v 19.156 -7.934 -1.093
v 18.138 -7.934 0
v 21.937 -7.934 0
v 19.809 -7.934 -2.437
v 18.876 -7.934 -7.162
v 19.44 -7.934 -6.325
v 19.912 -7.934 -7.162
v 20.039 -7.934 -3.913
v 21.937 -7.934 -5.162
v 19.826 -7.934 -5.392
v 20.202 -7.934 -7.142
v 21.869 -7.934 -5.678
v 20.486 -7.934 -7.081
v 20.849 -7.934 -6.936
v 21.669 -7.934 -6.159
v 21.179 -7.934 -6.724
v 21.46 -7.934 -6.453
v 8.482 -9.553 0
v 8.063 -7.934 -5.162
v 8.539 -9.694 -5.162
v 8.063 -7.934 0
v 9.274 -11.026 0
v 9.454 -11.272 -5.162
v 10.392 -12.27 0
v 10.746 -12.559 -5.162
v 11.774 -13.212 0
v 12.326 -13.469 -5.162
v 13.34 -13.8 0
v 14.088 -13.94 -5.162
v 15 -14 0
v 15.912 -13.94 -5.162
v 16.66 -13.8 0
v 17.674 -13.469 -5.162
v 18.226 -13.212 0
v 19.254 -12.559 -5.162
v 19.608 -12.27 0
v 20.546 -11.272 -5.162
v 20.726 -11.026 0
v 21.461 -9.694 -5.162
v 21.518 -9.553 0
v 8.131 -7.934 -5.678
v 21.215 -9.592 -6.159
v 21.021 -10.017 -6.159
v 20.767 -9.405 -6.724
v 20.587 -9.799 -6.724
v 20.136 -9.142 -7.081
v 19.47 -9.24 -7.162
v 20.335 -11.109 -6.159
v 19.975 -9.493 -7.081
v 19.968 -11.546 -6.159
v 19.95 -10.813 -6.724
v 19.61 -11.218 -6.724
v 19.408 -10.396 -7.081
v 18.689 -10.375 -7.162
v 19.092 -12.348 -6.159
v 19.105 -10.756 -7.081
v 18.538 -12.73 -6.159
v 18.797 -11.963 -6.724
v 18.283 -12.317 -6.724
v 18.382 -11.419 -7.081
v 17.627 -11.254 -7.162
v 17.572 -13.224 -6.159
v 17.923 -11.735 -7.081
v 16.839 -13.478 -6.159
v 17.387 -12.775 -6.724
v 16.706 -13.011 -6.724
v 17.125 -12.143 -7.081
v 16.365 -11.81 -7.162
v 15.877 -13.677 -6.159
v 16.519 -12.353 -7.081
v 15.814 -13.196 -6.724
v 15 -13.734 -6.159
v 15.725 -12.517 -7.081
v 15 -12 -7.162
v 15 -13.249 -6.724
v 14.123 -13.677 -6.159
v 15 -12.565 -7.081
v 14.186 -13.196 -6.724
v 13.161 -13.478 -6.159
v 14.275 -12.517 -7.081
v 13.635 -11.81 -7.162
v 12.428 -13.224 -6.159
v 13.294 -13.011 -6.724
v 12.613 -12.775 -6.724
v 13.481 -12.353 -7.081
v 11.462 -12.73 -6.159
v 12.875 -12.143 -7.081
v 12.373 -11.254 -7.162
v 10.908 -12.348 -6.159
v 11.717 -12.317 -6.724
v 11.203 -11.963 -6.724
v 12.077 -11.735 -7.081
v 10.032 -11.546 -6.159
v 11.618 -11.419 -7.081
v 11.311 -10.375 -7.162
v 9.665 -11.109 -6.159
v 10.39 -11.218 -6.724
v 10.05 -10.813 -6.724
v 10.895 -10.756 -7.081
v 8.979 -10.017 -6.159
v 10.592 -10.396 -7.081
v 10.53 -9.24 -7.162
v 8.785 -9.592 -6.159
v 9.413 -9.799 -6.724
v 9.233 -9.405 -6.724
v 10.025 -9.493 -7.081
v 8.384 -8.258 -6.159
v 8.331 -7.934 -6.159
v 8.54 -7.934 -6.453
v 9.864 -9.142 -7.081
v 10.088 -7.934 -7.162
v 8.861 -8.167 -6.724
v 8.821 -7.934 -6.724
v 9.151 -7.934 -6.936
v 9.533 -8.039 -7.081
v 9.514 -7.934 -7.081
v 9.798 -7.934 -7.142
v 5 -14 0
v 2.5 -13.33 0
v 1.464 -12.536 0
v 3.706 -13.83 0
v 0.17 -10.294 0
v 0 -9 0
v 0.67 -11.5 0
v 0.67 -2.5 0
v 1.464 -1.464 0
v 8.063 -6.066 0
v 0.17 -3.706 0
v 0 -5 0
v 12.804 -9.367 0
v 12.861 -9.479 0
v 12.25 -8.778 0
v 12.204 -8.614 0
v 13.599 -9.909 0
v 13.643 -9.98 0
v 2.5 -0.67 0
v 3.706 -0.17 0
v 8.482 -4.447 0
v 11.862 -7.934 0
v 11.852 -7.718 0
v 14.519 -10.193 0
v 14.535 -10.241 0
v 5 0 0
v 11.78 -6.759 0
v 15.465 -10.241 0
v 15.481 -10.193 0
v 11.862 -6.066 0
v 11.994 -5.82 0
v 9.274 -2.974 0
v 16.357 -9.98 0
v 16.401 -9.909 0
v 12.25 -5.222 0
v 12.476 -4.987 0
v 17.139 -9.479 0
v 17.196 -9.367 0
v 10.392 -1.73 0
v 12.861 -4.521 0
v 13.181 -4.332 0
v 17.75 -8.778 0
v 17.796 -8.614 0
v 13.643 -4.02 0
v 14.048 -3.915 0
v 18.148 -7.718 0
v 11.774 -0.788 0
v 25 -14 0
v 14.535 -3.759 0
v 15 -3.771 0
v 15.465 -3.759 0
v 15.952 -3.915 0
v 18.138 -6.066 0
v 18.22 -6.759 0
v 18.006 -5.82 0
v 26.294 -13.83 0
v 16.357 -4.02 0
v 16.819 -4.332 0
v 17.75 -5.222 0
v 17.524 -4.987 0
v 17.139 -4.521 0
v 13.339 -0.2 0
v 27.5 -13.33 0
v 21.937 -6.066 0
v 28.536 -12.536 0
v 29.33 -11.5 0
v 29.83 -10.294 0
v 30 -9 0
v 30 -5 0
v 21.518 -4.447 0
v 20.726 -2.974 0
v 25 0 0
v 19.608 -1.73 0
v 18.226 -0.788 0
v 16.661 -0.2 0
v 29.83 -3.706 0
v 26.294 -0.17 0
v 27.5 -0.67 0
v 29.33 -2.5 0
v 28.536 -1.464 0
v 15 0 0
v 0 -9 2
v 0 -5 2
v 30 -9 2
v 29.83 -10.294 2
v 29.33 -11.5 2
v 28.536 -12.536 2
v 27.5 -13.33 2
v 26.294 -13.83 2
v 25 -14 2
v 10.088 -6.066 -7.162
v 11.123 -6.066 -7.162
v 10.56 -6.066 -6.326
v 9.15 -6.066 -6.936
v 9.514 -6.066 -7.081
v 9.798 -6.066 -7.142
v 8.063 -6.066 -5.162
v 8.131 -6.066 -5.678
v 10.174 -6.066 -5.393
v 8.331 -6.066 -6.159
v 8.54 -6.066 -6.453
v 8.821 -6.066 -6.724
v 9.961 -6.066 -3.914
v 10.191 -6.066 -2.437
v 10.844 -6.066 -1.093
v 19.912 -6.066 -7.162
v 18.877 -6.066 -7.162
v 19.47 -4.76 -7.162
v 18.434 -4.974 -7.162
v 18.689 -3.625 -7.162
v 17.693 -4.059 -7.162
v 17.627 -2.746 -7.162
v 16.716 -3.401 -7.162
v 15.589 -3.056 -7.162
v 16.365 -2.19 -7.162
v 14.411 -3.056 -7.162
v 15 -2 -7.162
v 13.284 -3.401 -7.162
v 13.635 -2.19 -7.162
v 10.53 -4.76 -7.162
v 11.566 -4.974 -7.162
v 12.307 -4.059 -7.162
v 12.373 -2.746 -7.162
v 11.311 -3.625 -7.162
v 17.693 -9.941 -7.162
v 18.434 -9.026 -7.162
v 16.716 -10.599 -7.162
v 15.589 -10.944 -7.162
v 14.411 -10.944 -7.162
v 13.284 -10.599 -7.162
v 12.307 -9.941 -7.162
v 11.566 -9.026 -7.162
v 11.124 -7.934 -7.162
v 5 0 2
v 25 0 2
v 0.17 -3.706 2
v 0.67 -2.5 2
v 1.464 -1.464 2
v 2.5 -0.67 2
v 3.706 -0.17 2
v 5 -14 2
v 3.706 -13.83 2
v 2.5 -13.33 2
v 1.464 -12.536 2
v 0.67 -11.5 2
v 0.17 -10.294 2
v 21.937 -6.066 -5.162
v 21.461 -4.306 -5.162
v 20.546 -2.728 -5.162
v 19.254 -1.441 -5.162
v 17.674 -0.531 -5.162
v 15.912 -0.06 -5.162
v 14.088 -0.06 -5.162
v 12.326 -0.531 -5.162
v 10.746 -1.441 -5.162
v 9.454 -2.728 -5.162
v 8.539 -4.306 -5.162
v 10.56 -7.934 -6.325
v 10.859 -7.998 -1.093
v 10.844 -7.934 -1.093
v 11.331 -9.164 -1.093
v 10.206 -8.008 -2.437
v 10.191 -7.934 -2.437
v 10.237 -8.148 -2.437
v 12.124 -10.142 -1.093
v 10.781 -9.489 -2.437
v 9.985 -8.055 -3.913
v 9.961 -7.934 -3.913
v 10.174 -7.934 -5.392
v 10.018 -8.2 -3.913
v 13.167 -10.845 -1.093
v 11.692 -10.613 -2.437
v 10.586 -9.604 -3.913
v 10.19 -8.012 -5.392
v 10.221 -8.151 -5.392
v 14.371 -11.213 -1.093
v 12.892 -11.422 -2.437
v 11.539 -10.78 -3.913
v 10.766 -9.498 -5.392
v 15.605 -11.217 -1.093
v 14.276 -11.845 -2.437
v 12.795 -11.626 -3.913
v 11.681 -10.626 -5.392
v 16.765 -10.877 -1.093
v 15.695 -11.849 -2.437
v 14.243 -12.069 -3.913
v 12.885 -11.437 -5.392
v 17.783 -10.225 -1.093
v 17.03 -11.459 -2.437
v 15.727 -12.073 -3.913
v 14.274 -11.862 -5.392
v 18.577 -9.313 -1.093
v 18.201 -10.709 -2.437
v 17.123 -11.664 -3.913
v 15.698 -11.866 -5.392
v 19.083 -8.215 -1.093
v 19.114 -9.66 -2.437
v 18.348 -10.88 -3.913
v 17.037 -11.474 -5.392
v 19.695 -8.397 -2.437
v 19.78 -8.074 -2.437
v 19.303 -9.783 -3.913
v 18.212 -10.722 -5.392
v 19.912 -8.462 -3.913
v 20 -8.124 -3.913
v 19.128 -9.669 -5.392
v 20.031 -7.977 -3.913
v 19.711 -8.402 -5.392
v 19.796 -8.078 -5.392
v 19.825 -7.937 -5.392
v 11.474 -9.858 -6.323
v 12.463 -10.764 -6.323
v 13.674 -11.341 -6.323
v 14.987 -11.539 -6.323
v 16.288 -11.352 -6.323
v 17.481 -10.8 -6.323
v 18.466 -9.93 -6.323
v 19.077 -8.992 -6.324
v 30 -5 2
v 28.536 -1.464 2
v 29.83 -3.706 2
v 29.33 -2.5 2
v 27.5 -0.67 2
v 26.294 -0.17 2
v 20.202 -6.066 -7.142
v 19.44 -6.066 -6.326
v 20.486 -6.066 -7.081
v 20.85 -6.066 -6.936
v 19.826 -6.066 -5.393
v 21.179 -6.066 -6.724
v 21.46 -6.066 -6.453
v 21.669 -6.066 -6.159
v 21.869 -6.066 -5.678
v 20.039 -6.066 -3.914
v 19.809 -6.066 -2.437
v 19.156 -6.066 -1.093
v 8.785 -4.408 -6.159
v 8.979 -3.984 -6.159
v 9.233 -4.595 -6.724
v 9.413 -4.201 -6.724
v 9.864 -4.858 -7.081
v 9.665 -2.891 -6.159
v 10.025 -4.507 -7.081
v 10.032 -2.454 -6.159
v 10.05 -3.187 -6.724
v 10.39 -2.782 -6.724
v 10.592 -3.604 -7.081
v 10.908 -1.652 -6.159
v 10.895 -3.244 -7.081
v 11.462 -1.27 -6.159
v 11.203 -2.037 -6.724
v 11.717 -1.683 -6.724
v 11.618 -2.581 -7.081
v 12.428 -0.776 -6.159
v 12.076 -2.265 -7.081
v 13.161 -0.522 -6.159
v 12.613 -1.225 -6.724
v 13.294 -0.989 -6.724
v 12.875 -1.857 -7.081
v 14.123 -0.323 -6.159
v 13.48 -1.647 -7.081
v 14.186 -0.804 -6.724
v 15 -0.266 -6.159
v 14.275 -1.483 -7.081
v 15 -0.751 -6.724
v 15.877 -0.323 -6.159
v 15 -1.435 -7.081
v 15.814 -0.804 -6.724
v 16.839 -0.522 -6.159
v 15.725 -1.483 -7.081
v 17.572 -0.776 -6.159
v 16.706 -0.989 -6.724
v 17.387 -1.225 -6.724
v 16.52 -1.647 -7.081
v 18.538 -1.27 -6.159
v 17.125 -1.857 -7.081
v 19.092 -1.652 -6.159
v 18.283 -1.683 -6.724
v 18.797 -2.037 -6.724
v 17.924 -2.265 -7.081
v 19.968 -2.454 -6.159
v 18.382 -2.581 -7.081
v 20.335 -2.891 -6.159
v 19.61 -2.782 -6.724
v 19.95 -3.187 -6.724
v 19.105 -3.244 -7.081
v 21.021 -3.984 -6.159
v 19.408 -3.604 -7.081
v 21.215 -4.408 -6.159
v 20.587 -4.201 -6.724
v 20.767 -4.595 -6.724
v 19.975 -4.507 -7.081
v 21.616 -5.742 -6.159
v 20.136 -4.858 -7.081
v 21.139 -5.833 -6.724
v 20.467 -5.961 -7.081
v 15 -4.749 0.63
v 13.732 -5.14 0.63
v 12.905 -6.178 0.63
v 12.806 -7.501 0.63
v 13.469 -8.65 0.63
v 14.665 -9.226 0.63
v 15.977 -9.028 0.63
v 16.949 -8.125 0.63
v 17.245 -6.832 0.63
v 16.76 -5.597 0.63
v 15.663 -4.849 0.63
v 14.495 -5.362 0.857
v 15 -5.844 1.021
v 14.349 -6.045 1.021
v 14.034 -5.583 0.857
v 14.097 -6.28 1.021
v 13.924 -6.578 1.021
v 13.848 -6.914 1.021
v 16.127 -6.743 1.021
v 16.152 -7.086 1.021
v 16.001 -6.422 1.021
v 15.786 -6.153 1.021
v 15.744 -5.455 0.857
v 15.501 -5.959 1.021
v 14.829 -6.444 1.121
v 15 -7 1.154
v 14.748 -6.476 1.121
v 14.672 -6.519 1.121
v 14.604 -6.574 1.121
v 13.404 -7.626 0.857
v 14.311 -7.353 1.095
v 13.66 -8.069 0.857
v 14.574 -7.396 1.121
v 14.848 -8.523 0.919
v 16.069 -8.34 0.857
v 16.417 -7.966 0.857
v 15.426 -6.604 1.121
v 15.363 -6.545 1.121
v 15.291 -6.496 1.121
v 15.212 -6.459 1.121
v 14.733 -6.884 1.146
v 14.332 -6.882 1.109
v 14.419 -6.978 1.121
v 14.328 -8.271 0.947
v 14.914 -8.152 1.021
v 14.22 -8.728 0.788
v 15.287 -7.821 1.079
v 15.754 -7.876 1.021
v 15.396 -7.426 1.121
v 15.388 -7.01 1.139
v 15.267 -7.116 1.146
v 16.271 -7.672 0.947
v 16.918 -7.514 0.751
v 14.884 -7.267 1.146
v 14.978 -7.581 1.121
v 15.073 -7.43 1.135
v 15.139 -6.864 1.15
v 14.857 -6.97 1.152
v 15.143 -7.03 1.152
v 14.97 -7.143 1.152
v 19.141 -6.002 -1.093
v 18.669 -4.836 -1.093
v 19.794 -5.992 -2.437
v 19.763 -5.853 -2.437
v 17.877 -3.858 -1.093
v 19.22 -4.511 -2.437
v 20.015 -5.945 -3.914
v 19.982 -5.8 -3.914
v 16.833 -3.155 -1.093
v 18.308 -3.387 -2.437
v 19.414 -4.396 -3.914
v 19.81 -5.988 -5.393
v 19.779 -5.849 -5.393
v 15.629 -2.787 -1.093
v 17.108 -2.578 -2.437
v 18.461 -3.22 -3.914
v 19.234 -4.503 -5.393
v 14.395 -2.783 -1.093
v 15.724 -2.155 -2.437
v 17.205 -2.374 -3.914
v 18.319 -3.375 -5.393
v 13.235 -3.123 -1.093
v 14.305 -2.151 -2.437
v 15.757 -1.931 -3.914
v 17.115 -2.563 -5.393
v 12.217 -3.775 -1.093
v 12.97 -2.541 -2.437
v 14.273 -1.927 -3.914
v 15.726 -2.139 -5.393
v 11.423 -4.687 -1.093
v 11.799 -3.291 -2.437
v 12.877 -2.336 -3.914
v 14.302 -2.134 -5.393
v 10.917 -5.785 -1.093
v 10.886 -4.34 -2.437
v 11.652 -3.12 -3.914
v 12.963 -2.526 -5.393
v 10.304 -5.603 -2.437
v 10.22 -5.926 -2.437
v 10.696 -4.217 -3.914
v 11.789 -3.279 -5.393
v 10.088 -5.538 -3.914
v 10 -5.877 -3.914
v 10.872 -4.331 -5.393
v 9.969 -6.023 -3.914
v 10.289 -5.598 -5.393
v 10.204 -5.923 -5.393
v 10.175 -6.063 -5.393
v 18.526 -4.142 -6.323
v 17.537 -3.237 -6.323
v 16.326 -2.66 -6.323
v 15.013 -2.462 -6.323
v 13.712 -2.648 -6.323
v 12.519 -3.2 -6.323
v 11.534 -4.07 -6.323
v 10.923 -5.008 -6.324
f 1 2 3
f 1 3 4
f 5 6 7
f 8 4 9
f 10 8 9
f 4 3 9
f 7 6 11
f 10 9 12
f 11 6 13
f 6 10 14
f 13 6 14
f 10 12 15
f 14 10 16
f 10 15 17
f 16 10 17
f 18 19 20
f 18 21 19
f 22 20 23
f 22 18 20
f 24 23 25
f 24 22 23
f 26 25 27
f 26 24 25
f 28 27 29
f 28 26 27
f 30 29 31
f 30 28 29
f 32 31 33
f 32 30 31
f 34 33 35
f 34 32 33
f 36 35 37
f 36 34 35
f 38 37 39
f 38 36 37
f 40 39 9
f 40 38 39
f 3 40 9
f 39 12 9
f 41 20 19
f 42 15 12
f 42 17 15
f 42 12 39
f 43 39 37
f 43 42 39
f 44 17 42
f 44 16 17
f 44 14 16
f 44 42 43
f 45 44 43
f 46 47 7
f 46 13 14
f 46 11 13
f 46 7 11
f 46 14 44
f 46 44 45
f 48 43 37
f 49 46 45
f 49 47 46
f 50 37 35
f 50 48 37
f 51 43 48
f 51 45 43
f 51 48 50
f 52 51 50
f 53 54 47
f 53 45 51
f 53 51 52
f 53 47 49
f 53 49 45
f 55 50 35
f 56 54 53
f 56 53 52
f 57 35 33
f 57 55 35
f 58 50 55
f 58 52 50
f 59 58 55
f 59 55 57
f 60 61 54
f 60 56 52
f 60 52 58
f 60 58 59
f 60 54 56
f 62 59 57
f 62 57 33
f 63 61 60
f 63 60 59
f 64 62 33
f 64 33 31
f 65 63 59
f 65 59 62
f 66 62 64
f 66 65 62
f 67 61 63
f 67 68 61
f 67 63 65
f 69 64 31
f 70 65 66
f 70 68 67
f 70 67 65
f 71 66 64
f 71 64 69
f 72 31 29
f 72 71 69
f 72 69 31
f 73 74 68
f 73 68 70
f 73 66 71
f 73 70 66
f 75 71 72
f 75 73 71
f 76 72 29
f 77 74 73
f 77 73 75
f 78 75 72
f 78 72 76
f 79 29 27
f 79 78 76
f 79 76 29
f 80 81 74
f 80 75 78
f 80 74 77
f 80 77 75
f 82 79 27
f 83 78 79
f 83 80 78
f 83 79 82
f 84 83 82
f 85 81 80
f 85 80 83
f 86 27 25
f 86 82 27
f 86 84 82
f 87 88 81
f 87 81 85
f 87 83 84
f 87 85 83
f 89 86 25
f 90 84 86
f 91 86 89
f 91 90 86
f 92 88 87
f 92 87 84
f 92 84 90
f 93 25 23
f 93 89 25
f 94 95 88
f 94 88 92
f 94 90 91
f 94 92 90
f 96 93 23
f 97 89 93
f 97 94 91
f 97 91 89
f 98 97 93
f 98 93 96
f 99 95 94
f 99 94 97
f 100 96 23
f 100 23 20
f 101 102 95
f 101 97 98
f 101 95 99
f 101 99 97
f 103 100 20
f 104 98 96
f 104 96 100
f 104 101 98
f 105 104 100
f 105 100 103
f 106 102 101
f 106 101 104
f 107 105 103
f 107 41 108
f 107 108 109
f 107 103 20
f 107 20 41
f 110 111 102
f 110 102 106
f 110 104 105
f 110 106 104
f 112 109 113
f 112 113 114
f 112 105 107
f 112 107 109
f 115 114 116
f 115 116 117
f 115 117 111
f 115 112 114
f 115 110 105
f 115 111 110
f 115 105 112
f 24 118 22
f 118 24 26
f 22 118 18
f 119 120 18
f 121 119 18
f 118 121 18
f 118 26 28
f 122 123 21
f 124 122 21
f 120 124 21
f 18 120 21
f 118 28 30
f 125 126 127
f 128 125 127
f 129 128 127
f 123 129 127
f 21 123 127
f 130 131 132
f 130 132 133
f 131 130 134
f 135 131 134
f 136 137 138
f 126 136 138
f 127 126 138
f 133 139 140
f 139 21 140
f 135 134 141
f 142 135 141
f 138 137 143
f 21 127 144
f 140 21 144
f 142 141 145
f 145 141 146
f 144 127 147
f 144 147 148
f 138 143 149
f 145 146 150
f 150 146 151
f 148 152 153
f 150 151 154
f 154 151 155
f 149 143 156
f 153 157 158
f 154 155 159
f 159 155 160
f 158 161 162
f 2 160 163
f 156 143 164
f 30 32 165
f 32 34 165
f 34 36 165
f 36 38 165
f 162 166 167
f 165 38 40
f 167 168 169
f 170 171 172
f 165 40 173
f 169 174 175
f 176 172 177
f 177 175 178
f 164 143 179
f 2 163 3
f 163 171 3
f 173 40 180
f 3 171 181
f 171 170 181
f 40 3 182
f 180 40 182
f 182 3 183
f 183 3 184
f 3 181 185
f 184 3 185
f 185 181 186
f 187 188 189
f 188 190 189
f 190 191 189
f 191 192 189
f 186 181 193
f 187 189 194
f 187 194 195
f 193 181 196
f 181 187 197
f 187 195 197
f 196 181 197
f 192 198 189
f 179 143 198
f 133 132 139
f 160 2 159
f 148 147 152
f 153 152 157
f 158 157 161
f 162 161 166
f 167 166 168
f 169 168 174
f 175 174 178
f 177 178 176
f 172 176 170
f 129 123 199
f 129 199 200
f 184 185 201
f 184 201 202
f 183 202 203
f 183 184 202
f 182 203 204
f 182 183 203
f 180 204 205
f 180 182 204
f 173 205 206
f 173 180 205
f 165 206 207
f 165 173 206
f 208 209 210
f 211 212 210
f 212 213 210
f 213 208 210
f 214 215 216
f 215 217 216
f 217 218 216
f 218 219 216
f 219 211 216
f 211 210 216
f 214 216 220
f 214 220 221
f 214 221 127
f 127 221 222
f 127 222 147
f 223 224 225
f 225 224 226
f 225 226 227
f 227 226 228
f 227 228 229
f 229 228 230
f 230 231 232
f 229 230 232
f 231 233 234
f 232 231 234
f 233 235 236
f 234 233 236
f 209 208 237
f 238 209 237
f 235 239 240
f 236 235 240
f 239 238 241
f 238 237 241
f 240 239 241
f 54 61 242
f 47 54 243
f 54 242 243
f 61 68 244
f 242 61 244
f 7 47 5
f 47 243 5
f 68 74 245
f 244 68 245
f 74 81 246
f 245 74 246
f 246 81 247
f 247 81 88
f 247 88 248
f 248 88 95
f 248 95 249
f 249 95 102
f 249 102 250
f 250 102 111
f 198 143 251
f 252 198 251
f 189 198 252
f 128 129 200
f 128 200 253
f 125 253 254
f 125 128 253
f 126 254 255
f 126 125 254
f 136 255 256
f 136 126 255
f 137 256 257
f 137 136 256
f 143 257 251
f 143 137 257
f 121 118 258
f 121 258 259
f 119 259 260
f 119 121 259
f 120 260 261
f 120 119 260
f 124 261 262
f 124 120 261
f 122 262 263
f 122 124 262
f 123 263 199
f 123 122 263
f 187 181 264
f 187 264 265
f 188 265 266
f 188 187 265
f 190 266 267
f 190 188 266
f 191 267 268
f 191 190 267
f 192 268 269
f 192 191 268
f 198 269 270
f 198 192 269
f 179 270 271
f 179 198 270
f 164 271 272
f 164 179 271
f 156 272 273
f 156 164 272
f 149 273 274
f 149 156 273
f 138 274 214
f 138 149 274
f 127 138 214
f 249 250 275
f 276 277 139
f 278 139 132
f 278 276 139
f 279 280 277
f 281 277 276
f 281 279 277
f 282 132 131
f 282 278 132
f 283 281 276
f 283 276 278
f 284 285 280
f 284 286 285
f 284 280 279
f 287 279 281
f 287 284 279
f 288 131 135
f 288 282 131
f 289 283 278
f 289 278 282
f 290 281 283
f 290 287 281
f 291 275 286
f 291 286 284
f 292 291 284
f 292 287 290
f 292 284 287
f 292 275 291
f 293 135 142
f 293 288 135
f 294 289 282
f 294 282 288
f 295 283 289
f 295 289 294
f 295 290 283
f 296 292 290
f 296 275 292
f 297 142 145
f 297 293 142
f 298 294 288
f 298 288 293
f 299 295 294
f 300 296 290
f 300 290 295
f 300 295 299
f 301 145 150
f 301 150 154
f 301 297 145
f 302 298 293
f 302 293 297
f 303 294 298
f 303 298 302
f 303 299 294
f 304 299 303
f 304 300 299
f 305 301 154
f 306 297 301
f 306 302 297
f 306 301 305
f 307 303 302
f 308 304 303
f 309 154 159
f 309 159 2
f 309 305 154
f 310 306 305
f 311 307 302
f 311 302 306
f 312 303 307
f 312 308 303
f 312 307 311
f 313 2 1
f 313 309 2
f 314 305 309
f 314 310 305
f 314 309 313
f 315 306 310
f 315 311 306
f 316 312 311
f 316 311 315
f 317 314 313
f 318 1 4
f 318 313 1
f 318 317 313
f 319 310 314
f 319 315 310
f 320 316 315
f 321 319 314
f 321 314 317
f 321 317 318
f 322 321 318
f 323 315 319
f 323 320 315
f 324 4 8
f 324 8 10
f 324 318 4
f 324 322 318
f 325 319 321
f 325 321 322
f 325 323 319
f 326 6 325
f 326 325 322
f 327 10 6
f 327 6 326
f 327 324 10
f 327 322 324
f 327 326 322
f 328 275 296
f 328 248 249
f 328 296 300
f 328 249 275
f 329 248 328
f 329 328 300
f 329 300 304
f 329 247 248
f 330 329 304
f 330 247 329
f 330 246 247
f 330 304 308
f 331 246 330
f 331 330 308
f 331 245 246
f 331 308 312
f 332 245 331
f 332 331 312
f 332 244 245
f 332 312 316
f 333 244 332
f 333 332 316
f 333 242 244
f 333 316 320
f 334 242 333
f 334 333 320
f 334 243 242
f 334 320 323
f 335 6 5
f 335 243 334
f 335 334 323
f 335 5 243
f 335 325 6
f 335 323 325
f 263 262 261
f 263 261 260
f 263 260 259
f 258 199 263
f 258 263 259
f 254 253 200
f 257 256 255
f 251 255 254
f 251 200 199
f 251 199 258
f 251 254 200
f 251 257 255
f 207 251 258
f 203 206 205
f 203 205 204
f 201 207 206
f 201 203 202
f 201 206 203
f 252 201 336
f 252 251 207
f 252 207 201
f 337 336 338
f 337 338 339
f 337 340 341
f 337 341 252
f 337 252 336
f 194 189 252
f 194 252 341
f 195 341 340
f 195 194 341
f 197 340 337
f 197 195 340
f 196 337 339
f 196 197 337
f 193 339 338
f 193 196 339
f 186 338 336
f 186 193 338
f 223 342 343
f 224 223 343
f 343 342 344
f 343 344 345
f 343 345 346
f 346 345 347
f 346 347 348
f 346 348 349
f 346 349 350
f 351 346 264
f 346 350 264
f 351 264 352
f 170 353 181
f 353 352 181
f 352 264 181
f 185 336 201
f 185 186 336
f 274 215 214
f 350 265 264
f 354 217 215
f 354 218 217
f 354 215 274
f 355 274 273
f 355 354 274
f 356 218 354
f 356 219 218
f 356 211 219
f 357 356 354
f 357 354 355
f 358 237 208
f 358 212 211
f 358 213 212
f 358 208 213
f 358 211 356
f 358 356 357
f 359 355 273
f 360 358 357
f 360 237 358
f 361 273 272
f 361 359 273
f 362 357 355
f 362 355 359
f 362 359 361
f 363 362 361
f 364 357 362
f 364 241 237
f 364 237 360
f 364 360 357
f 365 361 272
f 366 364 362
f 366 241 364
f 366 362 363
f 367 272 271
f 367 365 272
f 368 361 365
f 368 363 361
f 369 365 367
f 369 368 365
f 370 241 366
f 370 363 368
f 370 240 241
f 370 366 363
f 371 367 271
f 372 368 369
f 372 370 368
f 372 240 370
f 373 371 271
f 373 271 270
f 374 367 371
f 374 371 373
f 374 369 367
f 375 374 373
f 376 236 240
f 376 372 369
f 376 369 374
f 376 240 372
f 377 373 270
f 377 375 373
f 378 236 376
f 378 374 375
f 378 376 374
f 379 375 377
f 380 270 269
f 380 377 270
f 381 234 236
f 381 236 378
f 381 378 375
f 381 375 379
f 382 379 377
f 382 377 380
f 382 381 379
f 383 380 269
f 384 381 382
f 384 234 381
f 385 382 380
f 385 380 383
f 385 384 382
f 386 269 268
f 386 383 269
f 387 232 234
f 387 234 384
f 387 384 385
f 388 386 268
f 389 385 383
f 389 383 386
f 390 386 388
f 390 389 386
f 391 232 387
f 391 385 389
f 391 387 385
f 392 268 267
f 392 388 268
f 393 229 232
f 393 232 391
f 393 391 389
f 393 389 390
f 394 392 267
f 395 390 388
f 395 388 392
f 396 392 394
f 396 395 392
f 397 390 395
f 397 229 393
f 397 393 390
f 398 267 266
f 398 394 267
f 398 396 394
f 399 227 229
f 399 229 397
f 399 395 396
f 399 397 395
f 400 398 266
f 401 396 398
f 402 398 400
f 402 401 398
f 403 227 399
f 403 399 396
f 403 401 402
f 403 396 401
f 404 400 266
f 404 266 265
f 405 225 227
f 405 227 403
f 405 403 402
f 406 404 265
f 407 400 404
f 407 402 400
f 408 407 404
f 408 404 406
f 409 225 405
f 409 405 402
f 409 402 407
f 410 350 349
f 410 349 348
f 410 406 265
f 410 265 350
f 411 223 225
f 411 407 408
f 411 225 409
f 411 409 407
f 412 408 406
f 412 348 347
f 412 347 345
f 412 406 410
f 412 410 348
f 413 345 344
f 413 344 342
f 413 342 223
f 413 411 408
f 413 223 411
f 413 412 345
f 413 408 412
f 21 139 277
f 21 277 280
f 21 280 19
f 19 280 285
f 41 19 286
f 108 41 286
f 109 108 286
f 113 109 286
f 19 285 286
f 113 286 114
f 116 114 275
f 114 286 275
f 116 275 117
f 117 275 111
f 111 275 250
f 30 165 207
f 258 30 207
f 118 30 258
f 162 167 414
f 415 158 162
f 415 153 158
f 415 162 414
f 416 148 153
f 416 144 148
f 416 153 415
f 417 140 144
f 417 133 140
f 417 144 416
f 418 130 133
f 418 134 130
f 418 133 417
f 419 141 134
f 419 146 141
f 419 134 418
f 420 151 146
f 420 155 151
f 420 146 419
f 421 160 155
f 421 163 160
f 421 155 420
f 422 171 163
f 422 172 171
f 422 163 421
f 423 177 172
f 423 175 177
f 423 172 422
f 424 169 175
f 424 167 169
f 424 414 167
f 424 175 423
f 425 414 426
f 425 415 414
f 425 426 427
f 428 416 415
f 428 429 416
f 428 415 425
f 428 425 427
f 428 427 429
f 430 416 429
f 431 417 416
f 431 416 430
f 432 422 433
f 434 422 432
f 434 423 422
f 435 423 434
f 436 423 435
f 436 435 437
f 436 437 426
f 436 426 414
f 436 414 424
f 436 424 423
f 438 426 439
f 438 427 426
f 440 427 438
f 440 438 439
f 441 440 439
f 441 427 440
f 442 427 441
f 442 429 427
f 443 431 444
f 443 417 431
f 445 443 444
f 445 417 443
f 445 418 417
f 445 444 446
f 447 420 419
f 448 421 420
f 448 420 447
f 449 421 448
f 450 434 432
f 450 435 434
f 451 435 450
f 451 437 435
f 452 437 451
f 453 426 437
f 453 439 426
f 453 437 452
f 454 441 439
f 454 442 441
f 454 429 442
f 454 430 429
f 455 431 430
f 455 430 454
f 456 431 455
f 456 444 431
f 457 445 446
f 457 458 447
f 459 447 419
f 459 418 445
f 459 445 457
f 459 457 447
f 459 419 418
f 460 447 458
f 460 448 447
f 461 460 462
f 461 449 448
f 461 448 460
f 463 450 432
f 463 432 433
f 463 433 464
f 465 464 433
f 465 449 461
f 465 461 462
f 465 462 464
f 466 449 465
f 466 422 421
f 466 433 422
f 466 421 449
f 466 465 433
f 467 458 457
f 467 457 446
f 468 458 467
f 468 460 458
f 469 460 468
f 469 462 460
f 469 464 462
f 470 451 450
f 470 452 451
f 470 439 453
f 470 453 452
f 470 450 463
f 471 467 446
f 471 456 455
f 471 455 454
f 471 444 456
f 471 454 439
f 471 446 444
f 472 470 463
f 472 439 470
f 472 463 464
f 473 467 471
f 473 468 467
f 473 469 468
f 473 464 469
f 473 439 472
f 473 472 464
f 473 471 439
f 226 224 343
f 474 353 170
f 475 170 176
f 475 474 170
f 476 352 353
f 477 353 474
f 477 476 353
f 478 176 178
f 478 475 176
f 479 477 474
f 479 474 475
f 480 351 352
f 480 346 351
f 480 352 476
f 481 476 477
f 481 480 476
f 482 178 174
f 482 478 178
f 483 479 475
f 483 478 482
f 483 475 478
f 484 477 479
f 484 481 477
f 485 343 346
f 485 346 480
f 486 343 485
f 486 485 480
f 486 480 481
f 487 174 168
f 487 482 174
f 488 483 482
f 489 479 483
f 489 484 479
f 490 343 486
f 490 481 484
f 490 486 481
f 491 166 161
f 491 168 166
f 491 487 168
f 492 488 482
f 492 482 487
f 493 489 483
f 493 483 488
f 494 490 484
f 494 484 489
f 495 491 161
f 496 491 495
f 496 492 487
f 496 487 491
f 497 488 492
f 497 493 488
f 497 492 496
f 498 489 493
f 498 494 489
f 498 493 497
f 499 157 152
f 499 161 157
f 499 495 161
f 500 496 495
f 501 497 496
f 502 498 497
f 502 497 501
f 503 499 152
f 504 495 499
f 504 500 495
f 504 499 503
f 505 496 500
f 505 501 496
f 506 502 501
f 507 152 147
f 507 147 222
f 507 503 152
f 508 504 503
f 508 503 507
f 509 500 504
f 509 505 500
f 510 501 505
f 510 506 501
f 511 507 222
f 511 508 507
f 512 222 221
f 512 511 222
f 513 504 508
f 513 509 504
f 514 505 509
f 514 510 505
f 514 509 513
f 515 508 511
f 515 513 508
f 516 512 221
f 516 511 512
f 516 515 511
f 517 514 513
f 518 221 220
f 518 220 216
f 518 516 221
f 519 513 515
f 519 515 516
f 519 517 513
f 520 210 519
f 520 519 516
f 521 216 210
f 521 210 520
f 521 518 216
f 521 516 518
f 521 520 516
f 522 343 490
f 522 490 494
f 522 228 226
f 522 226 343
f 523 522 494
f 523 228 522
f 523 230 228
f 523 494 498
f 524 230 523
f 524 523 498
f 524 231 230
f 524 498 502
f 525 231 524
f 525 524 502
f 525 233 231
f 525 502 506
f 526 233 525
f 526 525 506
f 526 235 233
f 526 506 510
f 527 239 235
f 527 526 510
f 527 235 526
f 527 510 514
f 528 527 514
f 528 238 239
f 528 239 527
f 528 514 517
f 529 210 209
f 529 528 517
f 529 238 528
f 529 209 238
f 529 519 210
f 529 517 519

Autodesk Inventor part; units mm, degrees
ref_plane "YZ Plane" through (0, 0, 0) normal (1, 0, 0) x (0, 1, 0)
ref_plane "XZ Plane" through (0, 0, 0) normal (0, 1, 0) x (-1, 0, 0)
ref_plane "XY Plane" through (0, 0, 0) normal (0, 0, 1) x (1, 0, 0)
sketch "Sketch1" plane through (0, 0, 0) normal (0, 0, 1) x (1, 0, 0)
  line L0 (5, 0) -> (25, 0)
  line L1 (30, -5) -> (30, -9)
  line L2 (25, -14) -> (5, -14)
  line L3 (0, -9) -> (0, -5)
  arc A0 (0, -9) -> (5, -14) centre (5, -9) ccw
  arc A1 (5, 0) -> (0, -5) centre (5, -5) ccw
  arc A2 (30, -5) -> (25, 0) centre (25, -5) ccw
  arc A3 (25, -14) -> (30, -9) centre (25, -9) ccw
  point P0 (0, 0)
  point P1 (30, -14)
  point P2 (30, 0)
  point P3 (0, -14)
  dimension "d0" = 30
  dimension "d1" = 14
  dimension "d2" = 5
extrude "Extrusion1" add sketch "Sketch1" along normal blind 2
ref_plane "Work Plane1" through (15, -9, 0) normal (-1, 0, 0) x (0, 0, 1)
sketch "Sketch2" plane through (15, -9, 0) normal (-1, 0, 0) x (0, 0, 1)
  circle A0 centre (-3.9426, 2) radius 4.775 construction
  line L0 (-3.9426, 2) -> (0, 2) construction
  line L1 (0, 0) -> (0, 4) construction
  line L2 (0, 4) -> (0, 9) construction
  line L3 (0, 9) -> (-5.1622, 9) construction
  line L4 (-7.1622, 7) -> (-7.1622, 5.2744) construction
  line L5 (-7.1622, 5.2744) -> (0, 5.2744) construction
  line L6 (0, 5.2744) -> (0, 9) construction
  arc A1 (0, 5.2744) -> (-7.1622, 5.9874) centre (-3.9426, 2) ccw
  line L7 (-7.1622, 5.9874) -> (-7.1622, 7)
  line L8 (-5.1622, 9) -> (0, 9)
  line L9 (0, 9) -> (2, 9) projected
  line L10 (0, 9) -> (0, 5.2744)
  arc A2 (-5.1622, 9) -> (-7.1622, 7) centre (-5.1622, 7) ccw
  line L11 (-5.1622, 9) -> (0, 9)
  dimension "d5" = 9.55
  dimension "d6" = 5.125
  dimension "d7" = 2
revolve "Revolution1" add sketch "Sketch2" angle 360 about axis through (15, -7, -3.9426) along (0, 0, 1)
sketch "Sketch3" plane through (15, -9, 0) normal (-1, 0, 0) x (0, 0, 1)
  line L0 (0, 0) -> (0, 4) projected
  line L1 (-7.1622, -1.9874) -> (-7.1622, 5.9874) projected
  line L2 (0, 2) -> (-7.1622, 2)
  line L3 (-7.1622, 2) -> (-7.1622, 2.9338)
  line L4 (-7.1622, 2.9338) -> (0, 2.9338)
  line L5 (0, 2.9338) -> (0, 2)
  line L6 (-7.1622, 2) -> (0, 2)
  line L7 (0, 2) -> (0, 1.066)
  line L8 (0, 1.066) -> (-7.1622, 1.066)
  line L9 (-7.1622, 1.066) -> (-7.1622, 2)
  point P0 (0, 9)
  point P1 (0, 2.9338)
  point P2 (-7.1622, 1.066)
  dimension "d9" = 0.934
extrude "Extrusion2" cut sketch "Sketch3" along normal through all both and the other way through all
sketch "Sketch4" plane through (15, -9, 0) normal (-1, 0, 0) x (0, 0, 1)
  line L0 (0, 4) -> (0, 9) projected
  arc A0 (1.1539, 2) -> (0, 5.2289) centre (-3.9407, 2) ccw
  line L1 (0, 4) -> (0, 0) projected
  line L2 (0, 2) -> (0, 5.2289)
  line L3 (0, 2) -> (1.1539, 2)
revolve "Revolution2" cut sketch "Sketch4" angle 360 about axis through (15, -7, -3.9426) along (0, 0, 1)
properties part number "Wheelmount"
